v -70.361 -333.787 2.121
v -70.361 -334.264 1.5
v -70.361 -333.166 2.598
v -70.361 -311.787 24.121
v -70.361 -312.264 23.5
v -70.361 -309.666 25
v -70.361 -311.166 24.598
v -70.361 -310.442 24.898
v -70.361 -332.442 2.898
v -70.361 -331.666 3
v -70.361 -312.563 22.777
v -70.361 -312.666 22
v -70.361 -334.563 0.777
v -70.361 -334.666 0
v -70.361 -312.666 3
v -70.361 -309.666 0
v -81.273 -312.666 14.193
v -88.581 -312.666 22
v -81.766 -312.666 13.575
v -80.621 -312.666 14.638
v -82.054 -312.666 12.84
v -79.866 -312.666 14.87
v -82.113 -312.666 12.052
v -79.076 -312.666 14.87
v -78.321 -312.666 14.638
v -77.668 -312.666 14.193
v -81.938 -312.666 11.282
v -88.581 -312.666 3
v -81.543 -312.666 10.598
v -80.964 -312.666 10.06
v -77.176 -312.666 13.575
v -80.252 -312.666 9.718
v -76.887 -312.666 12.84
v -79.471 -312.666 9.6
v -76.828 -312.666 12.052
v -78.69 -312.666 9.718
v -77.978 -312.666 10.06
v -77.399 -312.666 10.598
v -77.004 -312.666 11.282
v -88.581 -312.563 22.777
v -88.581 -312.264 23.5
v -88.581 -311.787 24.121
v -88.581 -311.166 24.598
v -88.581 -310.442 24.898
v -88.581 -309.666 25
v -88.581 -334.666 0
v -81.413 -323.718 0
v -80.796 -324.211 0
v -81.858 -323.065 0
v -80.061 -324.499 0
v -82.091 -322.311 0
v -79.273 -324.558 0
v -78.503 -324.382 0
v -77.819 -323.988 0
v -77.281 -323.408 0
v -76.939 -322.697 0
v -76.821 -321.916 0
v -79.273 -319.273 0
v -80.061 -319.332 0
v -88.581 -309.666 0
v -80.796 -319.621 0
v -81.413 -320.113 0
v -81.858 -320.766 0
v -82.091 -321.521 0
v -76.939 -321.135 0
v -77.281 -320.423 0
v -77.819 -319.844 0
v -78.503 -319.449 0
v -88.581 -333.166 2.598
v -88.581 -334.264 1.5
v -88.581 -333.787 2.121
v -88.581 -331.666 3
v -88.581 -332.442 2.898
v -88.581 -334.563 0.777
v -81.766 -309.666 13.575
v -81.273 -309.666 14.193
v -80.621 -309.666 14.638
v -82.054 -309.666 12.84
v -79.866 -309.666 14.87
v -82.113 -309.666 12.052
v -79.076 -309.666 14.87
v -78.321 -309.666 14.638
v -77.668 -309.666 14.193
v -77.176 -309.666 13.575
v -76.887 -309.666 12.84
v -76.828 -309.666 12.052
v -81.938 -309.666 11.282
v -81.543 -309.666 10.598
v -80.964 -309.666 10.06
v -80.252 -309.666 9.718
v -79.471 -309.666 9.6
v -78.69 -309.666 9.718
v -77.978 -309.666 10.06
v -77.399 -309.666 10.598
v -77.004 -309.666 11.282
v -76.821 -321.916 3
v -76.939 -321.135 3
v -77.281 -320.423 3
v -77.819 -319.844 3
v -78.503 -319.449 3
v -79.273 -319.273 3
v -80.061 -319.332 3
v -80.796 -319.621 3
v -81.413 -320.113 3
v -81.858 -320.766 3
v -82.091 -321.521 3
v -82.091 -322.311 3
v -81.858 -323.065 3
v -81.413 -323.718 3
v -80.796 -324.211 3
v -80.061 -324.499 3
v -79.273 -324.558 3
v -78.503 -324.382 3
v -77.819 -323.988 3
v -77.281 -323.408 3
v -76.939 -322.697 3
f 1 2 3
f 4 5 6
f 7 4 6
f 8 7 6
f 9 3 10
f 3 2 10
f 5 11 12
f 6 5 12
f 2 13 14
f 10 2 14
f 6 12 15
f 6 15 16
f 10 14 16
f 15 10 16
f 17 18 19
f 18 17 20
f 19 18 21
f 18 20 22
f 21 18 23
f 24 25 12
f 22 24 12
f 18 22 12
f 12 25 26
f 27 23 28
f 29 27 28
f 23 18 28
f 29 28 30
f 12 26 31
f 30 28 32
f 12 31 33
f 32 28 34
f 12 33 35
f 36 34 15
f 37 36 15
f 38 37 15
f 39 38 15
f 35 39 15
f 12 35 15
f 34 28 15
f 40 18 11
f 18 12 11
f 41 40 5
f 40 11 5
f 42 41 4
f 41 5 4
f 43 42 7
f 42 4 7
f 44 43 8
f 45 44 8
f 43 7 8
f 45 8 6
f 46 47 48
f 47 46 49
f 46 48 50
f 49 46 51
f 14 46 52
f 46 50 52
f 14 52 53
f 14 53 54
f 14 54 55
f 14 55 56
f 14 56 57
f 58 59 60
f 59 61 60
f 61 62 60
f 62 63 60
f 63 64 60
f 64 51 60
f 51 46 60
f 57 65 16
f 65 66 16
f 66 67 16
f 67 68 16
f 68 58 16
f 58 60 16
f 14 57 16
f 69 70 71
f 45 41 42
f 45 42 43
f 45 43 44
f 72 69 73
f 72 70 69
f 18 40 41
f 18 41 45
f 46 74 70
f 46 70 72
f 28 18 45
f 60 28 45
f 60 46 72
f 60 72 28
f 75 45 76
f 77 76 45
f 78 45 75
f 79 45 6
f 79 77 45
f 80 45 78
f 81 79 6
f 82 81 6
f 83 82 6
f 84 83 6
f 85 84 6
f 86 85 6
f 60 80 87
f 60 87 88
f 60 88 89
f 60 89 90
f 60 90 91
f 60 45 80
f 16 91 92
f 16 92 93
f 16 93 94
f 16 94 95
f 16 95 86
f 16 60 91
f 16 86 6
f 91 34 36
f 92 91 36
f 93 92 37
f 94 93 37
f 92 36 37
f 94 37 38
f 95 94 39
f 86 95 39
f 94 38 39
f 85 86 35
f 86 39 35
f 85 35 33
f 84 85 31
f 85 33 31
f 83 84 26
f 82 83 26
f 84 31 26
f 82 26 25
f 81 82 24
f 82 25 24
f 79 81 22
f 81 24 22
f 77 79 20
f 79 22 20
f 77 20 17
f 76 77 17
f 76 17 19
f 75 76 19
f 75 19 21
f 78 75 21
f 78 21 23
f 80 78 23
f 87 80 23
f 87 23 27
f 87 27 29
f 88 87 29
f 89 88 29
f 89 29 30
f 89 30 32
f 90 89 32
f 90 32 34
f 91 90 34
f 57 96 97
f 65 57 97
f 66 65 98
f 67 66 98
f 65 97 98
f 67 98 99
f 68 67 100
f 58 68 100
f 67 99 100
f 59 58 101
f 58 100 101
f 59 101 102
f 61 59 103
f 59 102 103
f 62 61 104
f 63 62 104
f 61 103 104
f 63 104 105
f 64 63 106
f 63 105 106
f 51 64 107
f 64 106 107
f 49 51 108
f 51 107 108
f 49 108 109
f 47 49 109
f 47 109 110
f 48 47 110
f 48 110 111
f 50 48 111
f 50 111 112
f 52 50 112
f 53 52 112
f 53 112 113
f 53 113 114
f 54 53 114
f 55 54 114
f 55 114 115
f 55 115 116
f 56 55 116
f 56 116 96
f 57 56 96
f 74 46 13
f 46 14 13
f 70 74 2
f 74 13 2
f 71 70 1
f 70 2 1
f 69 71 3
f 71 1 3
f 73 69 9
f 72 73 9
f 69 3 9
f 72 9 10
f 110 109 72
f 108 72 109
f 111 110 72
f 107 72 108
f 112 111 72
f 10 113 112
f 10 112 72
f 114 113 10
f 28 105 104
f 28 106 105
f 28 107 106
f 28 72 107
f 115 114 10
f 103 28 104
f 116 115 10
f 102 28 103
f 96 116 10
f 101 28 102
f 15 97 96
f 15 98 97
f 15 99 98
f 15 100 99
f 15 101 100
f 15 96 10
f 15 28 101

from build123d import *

# Parameters (mm, degrees)
ESBO_O1_W                = 18.22
ESBO_O1_H                = 25
RESSALTO_EXTRUS_O1_DEPTH = 3
ESBO_O2_W                = 18.22
ESBO_O2_H                = 3
RESSALTO_EXTRUS_O2_DEPTH = 22
ESBO_O3_R                = 2.65
CORTE_EXTRUS_O1_DEPTH    = 25
ESBO_O4_R                = 2.65
CORTE_EXTRUS_O2_DEPTH    = 25
FILETE1_R                = 3


with BuildPart() as part:
    # Esboço1 → Ressalto-extrusão1 (new body)
    with BuildSketch(Plane.XY):
        with Locations((-79.470886401, -322.165681156)):
            Rectangle(ESBO_O1_W, ESBO_O1_H)
    extrude(amount=RESSALTO_EXTRUS_O1_DEPTH)

    # Esboço2 → Ressalto-extrusão2 (add)
    with BuildSketch(Plane.XY.offset(3)):
        with Locations((-79.470886401, -311.165681156)):
            Rectangle(ESBO_O2_W, ESBO_O2_H)
    extrude(amount=RESSALTO_EXTRUS_O2_DEPTH)

    # Esboço3 → Corte-extrusão1 (cut)
    with BuildSketch(Plane.XY.offset(3)):
        with Locations((-79.470886401, -321.915681156)):
            Circle(ESBO_O3_R)
    extrude(amount=-CORTE_EXTRUS_O1_DEPTH, mode=Mode.SUBTRACT)

    # Esboço4 → Corte-extrusão2 (cut)
    with BuildSketch(Plane.XZ.offset(312.665681156)):
        with Locations(Location((-79.470886401, 12.25, 0), (0, 0, 270))):
            Circle(ESBO_O4_R)
    extrude(amount=-CORTE_EXTRUS_O2_DEPTH, mode=Mode.SUBTRACT)

    # Filete1
    filete1_edges = [part.edges().sort_by_distance(p)[0] for p in [
        (-79.470886401, -312.665681156, 25),
        (-79.470886401, -334.665681156, 3),
    ]]
    fillet(filete1_edges, radius=FILETE1_R - 0.0001)  # a hair under: the kernel refuses the full size


solid = part.part
